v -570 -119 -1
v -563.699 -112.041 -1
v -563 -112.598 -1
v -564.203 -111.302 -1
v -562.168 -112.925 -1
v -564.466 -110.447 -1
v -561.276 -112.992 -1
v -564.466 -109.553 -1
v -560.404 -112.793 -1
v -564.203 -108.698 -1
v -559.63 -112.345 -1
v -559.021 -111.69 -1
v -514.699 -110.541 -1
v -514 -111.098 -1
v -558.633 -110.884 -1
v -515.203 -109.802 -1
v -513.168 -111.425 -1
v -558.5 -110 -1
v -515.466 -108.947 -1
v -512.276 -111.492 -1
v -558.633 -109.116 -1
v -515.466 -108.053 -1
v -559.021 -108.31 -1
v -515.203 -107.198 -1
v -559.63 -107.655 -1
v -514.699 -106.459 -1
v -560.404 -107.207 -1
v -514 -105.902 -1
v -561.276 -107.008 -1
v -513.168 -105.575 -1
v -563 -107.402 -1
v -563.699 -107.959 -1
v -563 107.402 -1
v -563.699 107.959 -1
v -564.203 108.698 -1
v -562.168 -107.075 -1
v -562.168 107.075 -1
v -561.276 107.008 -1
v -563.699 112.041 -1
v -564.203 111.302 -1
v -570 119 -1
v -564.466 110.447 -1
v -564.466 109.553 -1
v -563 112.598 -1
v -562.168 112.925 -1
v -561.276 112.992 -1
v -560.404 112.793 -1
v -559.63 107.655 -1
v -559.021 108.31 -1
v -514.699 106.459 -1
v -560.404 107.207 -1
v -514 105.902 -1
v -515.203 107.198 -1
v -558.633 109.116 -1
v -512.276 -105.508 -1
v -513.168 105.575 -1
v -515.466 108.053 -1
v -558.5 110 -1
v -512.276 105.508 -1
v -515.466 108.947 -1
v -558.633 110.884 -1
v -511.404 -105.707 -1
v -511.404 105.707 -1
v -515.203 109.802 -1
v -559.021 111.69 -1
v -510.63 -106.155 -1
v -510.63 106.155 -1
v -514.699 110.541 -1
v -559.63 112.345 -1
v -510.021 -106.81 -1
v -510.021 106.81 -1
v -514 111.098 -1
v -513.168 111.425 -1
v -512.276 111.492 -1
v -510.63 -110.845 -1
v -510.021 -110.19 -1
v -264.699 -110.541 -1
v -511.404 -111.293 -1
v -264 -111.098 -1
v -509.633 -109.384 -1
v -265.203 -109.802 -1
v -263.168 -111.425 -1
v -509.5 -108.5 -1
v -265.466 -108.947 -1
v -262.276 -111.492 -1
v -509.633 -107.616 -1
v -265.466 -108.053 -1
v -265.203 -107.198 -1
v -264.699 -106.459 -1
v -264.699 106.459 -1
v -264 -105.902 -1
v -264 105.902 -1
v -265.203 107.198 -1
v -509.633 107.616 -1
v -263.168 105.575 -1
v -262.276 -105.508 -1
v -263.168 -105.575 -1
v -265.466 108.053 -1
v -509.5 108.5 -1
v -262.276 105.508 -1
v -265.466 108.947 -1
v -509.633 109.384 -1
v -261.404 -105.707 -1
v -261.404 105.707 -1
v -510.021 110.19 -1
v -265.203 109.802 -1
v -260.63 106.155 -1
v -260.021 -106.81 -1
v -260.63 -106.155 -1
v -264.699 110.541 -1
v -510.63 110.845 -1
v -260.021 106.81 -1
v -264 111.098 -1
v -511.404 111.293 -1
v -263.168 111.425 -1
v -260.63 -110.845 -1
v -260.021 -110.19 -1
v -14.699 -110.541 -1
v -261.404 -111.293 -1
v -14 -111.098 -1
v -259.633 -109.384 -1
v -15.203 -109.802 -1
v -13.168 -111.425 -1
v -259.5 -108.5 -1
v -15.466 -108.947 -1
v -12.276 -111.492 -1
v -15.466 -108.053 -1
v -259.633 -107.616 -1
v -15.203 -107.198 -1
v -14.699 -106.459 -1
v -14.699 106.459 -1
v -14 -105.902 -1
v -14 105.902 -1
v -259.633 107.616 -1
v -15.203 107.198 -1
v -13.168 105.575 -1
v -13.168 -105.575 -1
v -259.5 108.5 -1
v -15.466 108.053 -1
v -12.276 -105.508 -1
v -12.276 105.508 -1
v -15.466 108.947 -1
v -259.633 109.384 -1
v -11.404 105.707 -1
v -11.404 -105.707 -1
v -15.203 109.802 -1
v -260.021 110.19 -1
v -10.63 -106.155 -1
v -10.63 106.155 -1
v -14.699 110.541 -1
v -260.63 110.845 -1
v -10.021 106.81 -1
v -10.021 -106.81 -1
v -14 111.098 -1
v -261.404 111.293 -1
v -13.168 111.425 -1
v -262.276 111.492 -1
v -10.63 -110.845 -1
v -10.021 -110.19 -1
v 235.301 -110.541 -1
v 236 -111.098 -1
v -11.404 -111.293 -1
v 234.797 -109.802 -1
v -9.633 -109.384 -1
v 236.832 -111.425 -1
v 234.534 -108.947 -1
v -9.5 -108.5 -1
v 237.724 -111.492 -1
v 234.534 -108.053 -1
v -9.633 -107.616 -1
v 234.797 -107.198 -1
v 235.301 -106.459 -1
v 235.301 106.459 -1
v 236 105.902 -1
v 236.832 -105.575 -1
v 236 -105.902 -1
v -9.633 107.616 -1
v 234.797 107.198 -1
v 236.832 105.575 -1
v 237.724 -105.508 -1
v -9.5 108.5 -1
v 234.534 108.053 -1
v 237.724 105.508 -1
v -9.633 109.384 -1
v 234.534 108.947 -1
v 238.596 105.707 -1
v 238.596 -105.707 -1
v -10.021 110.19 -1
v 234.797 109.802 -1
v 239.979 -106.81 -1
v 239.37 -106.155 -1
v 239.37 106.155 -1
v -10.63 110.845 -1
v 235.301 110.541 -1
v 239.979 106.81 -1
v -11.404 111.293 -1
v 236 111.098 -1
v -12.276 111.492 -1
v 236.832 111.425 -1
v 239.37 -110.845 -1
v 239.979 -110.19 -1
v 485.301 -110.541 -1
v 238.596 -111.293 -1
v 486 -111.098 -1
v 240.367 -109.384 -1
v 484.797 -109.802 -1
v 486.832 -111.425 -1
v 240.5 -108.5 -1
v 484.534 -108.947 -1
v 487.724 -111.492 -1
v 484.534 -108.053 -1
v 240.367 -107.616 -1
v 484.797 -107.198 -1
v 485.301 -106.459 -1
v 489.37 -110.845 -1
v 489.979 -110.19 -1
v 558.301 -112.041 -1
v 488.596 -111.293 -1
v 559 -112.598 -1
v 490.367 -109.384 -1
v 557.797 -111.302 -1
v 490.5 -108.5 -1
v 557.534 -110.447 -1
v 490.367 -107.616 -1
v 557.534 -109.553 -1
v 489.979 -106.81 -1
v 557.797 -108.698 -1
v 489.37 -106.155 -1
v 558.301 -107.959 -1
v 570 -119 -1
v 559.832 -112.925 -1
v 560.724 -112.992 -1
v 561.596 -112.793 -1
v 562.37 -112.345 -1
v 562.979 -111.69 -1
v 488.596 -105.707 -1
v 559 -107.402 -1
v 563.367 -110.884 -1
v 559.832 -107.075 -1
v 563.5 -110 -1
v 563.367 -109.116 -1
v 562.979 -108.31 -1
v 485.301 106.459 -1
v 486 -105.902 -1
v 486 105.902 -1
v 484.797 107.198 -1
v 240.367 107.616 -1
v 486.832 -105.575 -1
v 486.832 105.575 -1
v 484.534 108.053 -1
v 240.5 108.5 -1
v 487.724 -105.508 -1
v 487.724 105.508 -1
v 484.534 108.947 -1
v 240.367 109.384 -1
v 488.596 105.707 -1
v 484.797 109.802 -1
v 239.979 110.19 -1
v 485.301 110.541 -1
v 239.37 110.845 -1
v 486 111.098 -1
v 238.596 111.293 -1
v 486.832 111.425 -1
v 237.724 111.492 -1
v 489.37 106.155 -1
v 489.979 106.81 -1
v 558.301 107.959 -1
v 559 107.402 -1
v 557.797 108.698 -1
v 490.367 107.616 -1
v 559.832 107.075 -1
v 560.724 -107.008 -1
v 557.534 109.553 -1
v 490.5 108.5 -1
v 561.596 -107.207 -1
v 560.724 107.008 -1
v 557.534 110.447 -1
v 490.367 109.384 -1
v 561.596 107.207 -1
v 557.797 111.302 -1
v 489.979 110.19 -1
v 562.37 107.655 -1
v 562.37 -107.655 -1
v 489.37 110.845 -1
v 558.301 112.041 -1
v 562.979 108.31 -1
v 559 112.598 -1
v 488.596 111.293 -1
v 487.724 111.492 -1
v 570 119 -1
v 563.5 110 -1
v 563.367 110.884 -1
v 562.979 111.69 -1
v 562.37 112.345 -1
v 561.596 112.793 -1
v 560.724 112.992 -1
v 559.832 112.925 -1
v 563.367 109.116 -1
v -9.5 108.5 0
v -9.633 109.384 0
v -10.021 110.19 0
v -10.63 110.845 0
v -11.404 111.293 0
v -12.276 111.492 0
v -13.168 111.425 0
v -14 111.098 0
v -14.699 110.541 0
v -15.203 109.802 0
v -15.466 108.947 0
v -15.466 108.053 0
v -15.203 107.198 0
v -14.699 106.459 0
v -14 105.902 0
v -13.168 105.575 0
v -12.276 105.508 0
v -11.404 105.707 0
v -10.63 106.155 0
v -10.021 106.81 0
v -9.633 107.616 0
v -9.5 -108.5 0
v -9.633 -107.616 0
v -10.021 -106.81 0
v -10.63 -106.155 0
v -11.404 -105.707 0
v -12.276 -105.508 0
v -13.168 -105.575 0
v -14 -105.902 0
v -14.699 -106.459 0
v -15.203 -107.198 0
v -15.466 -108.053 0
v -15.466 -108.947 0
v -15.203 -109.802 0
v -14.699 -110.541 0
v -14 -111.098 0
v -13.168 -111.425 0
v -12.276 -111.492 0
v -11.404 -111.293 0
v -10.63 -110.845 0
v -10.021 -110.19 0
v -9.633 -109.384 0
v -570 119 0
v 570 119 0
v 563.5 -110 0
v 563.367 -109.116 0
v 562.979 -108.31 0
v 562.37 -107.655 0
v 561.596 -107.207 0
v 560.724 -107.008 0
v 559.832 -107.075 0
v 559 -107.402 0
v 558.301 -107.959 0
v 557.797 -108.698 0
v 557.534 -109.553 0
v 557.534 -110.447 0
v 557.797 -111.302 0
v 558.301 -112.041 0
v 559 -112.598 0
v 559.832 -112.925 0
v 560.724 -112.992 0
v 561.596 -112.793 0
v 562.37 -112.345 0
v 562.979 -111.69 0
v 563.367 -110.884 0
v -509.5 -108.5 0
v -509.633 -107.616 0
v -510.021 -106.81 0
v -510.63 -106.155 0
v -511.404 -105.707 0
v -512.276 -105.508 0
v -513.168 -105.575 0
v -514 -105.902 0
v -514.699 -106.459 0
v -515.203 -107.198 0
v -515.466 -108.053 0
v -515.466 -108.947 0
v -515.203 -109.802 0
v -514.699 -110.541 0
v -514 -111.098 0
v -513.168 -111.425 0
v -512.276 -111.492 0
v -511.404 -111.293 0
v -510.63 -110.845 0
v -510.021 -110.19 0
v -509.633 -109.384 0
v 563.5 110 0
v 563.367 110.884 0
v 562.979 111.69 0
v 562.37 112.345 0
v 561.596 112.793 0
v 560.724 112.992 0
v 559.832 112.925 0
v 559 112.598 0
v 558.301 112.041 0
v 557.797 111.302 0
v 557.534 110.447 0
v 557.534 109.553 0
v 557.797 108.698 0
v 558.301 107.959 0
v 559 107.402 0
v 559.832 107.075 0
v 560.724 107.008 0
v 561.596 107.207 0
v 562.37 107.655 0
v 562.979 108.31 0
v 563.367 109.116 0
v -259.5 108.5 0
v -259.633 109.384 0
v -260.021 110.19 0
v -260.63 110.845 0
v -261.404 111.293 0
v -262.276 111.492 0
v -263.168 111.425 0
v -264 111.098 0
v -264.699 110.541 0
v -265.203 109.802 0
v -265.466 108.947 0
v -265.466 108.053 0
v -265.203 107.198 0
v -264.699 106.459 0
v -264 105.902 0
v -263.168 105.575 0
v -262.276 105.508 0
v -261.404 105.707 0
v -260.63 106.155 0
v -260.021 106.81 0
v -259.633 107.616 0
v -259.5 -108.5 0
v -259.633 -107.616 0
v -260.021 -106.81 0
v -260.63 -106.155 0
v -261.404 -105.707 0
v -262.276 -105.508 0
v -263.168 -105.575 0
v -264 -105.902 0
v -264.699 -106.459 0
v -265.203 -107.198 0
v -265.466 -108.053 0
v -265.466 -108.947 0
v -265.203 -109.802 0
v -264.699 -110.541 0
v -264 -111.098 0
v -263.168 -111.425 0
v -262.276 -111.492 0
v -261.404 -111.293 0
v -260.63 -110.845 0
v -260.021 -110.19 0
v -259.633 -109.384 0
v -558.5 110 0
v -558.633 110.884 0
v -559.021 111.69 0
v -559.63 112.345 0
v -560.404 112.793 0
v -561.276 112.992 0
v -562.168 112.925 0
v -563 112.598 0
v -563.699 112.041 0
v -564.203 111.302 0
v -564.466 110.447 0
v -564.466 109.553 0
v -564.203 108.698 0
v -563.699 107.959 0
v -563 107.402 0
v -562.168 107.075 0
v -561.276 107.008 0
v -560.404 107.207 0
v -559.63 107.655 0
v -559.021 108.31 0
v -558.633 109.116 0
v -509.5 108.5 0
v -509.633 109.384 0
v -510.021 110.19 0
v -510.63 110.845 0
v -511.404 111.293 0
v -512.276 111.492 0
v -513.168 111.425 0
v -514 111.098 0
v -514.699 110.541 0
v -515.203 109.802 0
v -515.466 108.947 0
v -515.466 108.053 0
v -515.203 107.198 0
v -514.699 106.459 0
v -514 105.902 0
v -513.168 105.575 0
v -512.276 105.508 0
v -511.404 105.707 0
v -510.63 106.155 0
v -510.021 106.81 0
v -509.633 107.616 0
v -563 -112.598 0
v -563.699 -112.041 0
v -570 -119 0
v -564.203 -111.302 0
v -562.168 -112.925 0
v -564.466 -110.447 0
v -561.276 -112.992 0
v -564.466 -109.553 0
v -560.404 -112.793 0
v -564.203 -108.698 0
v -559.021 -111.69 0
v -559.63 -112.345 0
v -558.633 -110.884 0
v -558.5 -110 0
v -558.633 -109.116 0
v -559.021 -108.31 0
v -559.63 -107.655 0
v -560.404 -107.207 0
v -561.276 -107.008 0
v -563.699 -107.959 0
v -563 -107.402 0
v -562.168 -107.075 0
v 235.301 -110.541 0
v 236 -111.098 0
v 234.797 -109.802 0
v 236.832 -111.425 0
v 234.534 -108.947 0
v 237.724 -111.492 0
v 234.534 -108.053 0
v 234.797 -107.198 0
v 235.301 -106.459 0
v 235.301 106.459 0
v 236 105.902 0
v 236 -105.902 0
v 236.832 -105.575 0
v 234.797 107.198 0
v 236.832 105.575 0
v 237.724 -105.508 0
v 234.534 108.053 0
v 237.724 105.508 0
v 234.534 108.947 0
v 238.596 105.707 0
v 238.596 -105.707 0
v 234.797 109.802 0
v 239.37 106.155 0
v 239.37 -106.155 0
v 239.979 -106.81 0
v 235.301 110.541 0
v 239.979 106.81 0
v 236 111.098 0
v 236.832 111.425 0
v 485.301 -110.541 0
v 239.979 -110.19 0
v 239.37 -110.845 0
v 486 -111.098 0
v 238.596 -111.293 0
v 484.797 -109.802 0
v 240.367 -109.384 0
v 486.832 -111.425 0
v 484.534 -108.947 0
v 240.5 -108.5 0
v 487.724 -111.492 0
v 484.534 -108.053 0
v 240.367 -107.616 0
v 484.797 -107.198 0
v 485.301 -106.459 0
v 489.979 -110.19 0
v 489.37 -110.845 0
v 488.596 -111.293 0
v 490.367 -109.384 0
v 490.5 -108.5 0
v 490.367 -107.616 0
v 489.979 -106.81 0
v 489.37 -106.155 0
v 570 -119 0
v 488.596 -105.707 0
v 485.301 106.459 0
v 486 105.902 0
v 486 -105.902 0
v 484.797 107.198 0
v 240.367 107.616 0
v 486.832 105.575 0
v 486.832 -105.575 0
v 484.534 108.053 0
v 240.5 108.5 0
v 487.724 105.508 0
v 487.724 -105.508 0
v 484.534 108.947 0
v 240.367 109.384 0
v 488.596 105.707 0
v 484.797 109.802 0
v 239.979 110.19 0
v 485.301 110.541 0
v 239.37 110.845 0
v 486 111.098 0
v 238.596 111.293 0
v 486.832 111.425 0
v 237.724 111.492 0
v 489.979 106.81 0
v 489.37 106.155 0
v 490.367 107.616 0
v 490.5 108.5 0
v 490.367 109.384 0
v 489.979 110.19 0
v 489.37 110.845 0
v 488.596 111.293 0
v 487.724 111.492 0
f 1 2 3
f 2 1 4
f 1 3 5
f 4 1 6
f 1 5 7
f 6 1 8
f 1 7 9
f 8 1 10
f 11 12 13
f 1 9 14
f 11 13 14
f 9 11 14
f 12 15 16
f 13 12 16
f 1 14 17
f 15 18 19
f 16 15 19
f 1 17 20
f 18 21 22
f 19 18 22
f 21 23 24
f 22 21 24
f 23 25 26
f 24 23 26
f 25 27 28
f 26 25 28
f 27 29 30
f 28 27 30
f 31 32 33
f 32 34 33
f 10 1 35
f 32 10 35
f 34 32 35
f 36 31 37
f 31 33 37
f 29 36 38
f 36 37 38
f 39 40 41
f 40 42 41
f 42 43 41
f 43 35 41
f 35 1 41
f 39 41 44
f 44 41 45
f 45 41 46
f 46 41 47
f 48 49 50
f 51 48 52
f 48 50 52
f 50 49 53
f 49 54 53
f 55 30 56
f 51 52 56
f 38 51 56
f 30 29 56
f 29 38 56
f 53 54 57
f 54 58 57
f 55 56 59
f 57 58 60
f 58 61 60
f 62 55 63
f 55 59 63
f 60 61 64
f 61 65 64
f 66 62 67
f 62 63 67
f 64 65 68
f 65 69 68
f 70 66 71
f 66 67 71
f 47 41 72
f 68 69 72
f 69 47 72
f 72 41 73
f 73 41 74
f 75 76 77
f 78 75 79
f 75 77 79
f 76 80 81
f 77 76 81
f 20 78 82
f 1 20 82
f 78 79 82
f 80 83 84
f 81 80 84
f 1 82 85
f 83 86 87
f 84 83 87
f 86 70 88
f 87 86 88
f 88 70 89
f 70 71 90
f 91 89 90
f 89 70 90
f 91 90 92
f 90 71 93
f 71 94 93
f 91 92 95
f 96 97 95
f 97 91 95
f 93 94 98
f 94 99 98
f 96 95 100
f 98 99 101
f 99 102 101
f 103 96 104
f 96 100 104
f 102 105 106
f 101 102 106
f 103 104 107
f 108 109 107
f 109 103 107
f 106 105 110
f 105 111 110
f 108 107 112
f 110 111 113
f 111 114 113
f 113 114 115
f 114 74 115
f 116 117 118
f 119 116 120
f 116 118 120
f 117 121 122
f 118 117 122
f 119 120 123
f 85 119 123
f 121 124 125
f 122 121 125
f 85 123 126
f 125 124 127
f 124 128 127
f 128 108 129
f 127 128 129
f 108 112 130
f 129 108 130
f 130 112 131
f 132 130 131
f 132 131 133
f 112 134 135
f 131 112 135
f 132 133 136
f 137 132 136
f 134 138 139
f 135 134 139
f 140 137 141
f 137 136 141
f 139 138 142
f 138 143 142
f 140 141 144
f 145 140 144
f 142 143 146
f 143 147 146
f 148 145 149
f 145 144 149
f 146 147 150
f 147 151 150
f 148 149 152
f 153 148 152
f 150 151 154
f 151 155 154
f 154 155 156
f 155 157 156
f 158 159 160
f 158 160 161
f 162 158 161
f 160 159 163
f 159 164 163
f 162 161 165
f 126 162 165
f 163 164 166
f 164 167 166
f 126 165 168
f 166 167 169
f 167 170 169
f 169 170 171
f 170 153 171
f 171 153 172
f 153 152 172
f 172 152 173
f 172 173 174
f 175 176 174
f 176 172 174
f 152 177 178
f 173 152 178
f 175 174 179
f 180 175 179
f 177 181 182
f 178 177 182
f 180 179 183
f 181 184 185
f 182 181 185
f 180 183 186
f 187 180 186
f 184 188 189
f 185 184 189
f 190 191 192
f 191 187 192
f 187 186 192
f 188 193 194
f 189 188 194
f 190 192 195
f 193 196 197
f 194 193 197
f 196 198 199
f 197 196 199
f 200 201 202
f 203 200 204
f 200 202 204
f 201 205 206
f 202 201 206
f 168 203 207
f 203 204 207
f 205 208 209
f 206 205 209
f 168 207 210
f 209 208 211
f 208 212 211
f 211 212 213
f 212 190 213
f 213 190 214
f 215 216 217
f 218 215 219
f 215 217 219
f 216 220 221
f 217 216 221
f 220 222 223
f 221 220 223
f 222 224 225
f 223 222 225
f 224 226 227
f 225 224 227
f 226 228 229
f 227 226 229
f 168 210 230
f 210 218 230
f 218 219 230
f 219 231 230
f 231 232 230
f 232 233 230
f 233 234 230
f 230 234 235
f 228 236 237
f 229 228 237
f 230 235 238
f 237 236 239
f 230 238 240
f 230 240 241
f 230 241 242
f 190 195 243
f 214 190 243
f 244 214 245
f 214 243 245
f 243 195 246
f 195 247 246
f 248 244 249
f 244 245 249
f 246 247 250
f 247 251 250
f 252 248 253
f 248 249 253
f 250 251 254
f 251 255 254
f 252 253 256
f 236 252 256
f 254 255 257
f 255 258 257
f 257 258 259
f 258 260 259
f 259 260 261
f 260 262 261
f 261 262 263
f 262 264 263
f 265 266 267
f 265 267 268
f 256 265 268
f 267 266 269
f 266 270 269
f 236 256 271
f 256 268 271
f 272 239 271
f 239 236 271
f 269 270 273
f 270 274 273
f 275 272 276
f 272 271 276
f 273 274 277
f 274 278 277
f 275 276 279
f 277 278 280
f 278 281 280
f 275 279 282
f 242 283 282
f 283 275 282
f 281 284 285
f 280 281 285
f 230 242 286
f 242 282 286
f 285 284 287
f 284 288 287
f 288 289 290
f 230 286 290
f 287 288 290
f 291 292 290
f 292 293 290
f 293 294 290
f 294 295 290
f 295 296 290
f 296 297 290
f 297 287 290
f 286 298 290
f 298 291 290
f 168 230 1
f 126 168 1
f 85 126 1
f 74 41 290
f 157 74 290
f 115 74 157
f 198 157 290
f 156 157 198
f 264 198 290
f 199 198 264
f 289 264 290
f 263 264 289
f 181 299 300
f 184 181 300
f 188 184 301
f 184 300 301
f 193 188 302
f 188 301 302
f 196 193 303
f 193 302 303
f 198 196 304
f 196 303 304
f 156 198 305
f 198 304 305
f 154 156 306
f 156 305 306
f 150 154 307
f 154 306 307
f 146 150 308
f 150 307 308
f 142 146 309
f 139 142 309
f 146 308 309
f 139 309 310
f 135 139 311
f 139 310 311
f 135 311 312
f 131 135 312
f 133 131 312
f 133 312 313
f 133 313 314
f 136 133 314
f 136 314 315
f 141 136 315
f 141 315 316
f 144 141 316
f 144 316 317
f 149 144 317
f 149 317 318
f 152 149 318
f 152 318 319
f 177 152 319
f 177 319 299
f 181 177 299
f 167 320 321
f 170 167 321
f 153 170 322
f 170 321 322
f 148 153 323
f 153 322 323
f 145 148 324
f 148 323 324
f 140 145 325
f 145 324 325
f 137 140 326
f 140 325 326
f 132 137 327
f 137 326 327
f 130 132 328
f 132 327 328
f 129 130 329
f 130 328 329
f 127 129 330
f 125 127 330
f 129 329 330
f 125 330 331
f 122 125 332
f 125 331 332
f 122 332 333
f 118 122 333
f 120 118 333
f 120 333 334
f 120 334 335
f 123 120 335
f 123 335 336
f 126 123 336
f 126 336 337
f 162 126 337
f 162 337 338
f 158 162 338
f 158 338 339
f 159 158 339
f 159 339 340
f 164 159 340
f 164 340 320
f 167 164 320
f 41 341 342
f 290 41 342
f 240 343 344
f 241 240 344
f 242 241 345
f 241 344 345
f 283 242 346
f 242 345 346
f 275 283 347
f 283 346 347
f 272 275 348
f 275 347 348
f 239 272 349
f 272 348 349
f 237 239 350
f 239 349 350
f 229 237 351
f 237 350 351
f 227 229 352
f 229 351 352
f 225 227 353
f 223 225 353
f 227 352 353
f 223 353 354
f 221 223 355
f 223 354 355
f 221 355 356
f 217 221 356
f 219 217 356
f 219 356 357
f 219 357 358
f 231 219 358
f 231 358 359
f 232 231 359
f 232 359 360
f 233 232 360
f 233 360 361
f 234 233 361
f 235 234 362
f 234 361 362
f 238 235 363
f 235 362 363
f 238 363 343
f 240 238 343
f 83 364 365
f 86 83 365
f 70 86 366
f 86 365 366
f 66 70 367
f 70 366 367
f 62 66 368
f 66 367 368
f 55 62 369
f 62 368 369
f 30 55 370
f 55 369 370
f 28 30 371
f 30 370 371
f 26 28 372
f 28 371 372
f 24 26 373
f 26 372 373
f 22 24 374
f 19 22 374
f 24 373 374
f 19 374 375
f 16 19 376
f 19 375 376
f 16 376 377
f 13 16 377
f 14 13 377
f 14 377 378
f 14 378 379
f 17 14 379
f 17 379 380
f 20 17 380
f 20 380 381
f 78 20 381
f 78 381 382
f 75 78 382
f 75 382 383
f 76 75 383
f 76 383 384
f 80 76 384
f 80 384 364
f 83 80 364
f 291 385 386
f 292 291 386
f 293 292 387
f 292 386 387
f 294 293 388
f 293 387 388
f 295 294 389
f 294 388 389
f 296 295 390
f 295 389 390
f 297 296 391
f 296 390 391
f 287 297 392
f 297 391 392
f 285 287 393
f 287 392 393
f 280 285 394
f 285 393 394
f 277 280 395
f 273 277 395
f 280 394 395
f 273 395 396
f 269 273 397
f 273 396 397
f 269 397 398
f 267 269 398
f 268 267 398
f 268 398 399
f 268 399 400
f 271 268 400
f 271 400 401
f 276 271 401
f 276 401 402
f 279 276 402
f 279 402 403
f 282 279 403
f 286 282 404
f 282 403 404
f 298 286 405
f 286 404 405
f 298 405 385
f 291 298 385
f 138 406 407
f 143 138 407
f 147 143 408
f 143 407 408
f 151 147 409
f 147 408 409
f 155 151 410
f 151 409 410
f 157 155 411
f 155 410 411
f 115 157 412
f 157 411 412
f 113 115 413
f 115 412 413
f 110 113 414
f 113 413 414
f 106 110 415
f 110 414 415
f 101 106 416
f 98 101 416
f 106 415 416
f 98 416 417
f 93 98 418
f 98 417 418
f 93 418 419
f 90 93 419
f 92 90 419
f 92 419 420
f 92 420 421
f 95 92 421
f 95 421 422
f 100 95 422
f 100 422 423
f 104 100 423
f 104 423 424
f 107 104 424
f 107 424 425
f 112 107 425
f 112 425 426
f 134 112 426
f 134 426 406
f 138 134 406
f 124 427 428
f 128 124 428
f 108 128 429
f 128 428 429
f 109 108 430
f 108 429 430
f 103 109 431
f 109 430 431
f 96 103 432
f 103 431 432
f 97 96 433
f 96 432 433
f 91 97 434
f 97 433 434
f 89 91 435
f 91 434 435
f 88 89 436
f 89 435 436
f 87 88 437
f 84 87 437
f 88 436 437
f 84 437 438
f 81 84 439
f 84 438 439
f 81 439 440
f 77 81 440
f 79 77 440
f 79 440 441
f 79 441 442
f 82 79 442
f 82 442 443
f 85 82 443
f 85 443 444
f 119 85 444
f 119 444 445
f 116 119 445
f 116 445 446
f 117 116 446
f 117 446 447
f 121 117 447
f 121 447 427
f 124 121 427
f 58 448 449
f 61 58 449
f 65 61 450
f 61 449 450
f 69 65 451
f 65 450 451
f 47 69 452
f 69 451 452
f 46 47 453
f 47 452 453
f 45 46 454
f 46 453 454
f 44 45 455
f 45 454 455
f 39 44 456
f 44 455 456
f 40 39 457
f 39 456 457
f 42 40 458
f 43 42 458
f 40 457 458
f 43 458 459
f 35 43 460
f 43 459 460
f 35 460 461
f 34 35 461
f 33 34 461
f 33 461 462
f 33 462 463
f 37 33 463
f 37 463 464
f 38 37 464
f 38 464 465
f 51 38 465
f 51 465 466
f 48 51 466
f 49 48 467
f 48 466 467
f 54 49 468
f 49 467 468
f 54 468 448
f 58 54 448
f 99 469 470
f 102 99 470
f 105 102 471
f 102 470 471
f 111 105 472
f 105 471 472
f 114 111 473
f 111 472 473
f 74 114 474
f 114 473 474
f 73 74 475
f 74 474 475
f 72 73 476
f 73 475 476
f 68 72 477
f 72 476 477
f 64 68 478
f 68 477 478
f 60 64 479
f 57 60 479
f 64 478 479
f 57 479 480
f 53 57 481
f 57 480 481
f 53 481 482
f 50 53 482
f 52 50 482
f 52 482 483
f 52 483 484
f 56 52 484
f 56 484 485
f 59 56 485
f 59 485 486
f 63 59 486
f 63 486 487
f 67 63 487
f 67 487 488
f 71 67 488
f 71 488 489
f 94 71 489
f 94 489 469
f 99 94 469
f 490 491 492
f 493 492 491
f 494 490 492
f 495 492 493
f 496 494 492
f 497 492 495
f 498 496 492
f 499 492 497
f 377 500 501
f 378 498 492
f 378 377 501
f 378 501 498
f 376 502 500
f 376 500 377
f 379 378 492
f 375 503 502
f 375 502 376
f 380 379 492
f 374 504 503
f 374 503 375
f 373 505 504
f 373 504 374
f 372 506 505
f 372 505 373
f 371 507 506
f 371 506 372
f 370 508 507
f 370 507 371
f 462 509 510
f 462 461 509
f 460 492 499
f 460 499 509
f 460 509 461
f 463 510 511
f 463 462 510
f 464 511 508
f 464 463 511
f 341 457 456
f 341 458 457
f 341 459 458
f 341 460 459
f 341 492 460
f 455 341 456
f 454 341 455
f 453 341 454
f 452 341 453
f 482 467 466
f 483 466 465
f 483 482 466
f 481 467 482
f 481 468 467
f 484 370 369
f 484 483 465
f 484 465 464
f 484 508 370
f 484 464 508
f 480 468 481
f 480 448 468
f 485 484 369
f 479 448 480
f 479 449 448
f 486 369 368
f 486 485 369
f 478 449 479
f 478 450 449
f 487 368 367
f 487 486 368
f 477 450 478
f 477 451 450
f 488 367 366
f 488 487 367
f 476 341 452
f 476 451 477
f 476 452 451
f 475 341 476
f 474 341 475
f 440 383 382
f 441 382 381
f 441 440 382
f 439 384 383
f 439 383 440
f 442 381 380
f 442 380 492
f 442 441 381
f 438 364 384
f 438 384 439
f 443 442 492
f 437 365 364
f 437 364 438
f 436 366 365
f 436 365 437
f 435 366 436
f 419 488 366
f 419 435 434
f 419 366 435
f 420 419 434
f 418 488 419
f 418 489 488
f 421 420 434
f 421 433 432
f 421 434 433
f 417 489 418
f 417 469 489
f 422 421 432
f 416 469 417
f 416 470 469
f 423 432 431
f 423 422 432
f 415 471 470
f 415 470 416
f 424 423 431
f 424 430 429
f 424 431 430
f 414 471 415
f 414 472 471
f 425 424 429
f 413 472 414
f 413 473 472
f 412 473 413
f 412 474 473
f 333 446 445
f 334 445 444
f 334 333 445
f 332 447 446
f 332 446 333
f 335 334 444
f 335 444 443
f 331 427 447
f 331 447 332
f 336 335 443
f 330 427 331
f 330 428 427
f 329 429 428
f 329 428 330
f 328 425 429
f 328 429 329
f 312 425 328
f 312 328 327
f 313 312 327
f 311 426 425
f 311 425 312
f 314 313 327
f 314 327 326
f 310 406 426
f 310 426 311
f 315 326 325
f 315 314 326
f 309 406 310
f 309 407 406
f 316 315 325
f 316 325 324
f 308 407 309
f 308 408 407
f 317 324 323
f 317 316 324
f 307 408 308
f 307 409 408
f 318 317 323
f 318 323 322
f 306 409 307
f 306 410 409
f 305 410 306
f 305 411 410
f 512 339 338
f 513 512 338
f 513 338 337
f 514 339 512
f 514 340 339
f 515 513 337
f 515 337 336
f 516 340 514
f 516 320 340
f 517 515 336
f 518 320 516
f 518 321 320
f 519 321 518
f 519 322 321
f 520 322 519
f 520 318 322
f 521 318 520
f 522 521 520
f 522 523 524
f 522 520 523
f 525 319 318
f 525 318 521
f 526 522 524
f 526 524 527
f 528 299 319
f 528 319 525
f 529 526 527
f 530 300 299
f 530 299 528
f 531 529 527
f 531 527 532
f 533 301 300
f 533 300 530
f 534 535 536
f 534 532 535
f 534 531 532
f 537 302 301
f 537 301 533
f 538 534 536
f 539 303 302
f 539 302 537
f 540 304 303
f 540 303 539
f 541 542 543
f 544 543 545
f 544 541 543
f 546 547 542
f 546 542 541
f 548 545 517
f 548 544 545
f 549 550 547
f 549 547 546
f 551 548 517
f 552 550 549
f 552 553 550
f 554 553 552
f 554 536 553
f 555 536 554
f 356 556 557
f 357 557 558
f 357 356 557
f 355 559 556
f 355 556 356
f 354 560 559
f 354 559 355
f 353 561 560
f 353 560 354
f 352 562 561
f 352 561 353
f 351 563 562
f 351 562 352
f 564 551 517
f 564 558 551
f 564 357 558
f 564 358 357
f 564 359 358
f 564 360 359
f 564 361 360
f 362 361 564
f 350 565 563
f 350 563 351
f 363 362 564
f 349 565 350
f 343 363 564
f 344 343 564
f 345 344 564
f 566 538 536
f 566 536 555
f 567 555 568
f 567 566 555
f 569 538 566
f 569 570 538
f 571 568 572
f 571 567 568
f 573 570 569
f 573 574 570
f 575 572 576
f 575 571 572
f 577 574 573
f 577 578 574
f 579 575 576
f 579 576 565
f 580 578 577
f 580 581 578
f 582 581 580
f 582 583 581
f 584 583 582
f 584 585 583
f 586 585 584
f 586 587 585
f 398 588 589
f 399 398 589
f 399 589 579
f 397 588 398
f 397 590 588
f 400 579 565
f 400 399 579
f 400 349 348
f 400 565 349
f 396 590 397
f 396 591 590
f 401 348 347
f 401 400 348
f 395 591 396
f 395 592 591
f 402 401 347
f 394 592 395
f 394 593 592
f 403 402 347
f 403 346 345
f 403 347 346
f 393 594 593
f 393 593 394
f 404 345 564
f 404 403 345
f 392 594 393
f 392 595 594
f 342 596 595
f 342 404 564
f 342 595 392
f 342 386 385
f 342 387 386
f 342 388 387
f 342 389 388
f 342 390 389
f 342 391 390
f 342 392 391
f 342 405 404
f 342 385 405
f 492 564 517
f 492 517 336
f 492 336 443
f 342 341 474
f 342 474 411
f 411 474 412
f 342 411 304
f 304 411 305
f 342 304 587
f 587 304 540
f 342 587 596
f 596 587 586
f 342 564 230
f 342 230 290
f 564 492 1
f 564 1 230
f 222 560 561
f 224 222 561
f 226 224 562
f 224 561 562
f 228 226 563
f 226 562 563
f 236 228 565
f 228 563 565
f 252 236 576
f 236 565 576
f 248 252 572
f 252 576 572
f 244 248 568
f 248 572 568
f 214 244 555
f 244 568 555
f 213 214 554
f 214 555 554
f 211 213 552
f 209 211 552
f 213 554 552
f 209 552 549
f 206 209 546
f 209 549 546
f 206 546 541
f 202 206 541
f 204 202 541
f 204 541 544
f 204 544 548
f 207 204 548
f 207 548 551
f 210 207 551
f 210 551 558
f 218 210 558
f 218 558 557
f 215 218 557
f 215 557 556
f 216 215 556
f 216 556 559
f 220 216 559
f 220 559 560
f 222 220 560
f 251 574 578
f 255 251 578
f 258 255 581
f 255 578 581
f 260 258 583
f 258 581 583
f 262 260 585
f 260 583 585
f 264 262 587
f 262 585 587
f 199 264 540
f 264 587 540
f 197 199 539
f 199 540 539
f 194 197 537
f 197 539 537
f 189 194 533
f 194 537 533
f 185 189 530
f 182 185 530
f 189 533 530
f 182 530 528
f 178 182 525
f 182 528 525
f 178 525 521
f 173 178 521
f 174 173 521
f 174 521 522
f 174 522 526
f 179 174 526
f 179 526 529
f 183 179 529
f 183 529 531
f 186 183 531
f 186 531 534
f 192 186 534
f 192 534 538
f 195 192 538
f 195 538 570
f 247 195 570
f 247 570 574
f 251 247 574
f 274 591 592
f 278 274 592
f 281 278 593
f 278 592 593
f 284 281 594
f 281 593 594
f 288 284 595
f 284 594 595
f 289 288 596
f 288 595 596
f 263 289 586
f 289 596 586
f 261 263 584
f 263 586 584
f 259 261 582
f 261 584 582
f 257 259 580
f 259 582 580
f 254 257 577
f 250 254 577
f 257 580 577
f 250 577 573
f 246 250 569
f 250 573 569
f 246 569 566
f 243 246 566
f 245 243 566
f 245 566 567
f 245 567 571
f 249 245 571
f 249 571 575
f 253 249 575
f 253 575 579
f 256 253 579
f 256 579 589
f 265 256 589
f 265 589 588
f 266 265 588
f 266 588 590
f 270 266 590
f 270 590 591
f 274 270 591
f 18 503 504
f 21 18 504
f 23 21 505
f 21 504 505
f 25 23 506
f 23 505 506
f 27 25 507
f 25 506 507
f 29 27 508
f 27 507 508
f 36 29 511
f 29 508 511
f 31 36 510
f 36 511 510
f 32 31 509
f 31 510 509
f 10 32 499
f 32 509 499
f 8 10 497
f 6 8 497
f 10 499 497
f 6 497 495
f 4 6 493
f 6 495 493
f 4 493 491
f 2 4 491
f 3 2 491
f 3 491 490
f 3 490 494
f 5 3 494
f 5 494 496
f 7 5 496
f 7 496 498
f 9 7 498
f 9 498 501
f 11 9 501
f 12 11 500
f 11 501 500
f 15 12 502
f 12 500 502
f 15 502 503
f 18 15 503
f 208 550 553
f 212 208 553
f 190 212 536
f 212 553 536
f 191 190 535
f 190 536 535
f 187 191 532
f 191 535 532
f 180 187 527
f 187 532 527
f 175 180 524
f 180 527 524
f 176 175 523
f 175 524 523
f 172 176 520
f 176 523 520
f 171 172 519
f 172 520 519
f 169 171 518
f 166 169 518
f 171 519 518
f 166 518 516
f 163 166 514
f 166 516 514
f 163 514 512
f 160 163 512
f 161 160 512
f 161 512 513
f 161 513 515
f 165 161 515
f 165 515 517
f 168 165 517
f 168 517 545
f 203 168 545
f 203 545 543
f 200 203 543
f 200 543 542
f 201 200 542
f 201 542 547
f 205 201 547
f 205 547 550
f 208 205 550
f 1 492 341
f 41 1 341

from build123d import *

# Parameters (mm, degrees)
SKETCH_1_W             = 1140
SKETCH_1_H             = 238
SKETCH_1_R             = 3
SM_BASE_FLANGE_1_DEPTH = 1
CUT_EXTRUDE_1_REACH    = 584.29
SKETCH_3_R             = 3


# Sheet-metal steps are written as plain solids
with BuildPart() as part:
    # Sketch 1 → 基体-法兰1 (new body)
    with BuildSketch(Plane.XY):
        Rectangle(SKETCH_1_W, SKETCH_1_H)
        with Locations((-561.5, 110)):
            Circle(SKETCH_1_R, mode=Mode.SUBTRACT)
        with Locations((-561.5, -110)):
            Circle(SKETCH_1_R, mode=Mode.SUBTRACT)
        with Locations((560.5, 110)):
            Circle(SKETCH_1_R, mode=Mode.SUBTRACT)
        with Locations((560.5, -110)):
            Circle(SKETCH_1_R, mode=Mode.SUBTRACT)
    extrude(amount=-SM_BASE_FLANGE_1_DEPTH)

    # 草图3 → 切除-拉伸1 (cut, up to next)
    with BuildSketch(Plane.XY, mode=Mode.PRIVATE) as cut_extrude_1_sk1:
        with Locations((-512.5, 108.5)):
            Circle(SKETCH_3_R)
    cut_extrude_1_tool1 = extrude(cut_extrude_1_sk1.sketch, amount=-CUT_EXTRUDE_1_REACH, mode=Mode.PRIVATE) & part.part
    # 草图3 → 切除-拉伸1 (cut, up to next)
    with BuildSketch(Plane.XY, mode=Mode.PRIVATE) as cut_extrude_1_sk2:
        with Locations((-262.5, 108.5)):
            Circle(SKETCH_3_R)
    cut_extrude_1_tool2 = extrude(cut_extrude_1_sk2.sketch, amount=-CUT_EXTRUDE_1_REACH, mode=Mode.PRIVATE) & part.part
    # 草图3 → 切除-拉伸1 (cut, up to next)
    with BuildSketch(Plane.XY, mode=Mode.PRIVATE) as cut_extrude_1_sk3:
        with Locations((-12.5, 108.5)):
            Circle(SKETCH_3_R)
    cut_extrude_1_tool3 = extrude(cut_extrude_1_sk3.sketch, amount=-CUT_EXTRUDE_1_REACH, mode=Mode.PRIVATE) & part.part
    # 草图3 → 切除-拉伸1 (cut, up to next)
    with BuildSketch(Plane.XY, mode=Mode.PRIVATE) as cut_extrude_1_sk4:
        with Locations((237.5, 108.5)):
            Circle(SKETCH_3_R)
    cut_extrude_1_tool4 = extrude(cut_extrude_1_sk4.sketch, amount=-CUT_EXTRUDE_1_REACH, mode=Mode.PRIVATE) & part.part
    # 草图3 → 切除-拉伸1 (cut, up to next)
    with BuildSketch(Plane.XY, mode=Mode.PRIVATE) as cut_extrude_1_sk5:
        with Locations((487.5, 108.5)):
            Circle(SKETCH_3_R)
    cut_extrude_1_tool5 = extrude(cut_extrude_1_sk5.sketch, amount=-CUT_EXTRUDE_1_REACH, mode=Mode.PRIVATE) & part.part
    # 草图3 → 切除-拉伸1 (cut, up to next)
    with BuildSketch(Plane.XY, mode=Mode.PRIVATE) as cut_extrude_1_sk6:
        with Locations((-512.5, -108.5)):
            Circle(SKETCH_3_R)
    cut_extrude_1_tool6 = extrude(cut_extrude_1_sk6.sketch, amount=-CUT_EXTRUDE_1_REACH, mode=Mode.PRIVATE) & part.part
    # 草图3 → 切除-拉伸1 (cut, up to next)
    with BuildSketch(Plane.XY, mode=Mode.PRIVATE) as cut_extrude_1_sk7:
        with Locations((-262.5, -108.5)):
            Circle(SKETCH_3_R)
    cut_extrude_1_tool7 = extrude(cut_extrude_1_sk7.sketch, amount=-CUT_EXTRUDE_1_REACH, mode=Mode.PRIVATE) & part.part
    # 草图3 → 切除-拉伸1 (cut, up to next)
    with BuildSketch(Plane.XY, mode=Mode.PRIVATE) as cut_extrude_1_sk8:
        with Locations((-12.5, -108.5)):
            Circle(SKETCH_3_R)
    cut_extrude_1_tool8 = extrude(cut_extrude_1_sk8.sketch, amount=-CUT_EXTRUDE_1_REACH, mode=Mode.PRIVATE) & part.part
    # 草图3 → 切除-拉伸1 (cut, up to next)
    with BuildSketch(Plane.XY, mode=Mode.PRIVATE) as cut_extrude_1_sk9:
        with Locations((237.5, -108.5)):
            Circle(SKETCH_3_R)
    cut_extrude_1_tool9 = extrude(cut_extrude_1_sk9.sketch, amount=-CUT_EXTRUDE_1_REACH, mode=Mode.PRIVATE) & part.part
    # 草图3 → 切除-拉伸1 (cut, up to next)
    with BuildSketch(Plane.XY, mode=Mode.PRIVATE) as cut_extrude_1_sk10:
        with Locations((487.5, -108.5)):
            Circle(SKETCH_3_R)
    cut_extrude_1_tool10 = extrude(cut_extrude_1_sk10.sketch, amount=-CUT_EXTRUDE_1_REACH, mode=Mode.PRIVATE) & part.part
    add(cut_extrude_1_tool1.solids().sort_by_distance((-512.5, 108.5, 0))[0], mode=Mode.SUBTRACT)
    add(cut_extrude_1_tool2.solids().sort_by_distance((-262.5, 108.5, 0))[0], mode=Mode.SUBTRACT)
    add(cut_extrude_1_tool3.solids().sort_by_distance((-12.5, 108.5, 0))[0], mode=Mode.SUBTRACT)
    add(cut_extrude_1_tool4.solids().sort_by_distance((237.5, 108.5, 0))[0], mode=Mode.SUBTRACT)
    add(cut_extrude_1_tool5.solids().sort_by_distance((487.5, 108.5, 0))[0], mode=Mode.SUBTRACT)
    add(cut_extrude_1_tool6.solids().sort_by_distance((-512.5, -108.5, 0))[0], mode=Mode.SUBTRACT)
    add(cut_extrude_1_tool7.solids().sort_by_distance((-262.5, -108.5, 0))[0], mode=Mode.SUBTRACT)
    add(cut_extrude_1_tool8.solids().sort_by_distance((-12.5, -108.5, 0))[0], mode=Mode.SUBTRACT)
    add(cut_extrude_1_tool9.solids().sort_by_distance((237.5, -108.5, 0))[0], mode=Mode.SUBTRACT)
    add(cut_extrude_1_tool10.solids().sort_by_distance((487.5, -108.5, 0))[0], mode=Mode.SUBTRACT)


solid = part.part
